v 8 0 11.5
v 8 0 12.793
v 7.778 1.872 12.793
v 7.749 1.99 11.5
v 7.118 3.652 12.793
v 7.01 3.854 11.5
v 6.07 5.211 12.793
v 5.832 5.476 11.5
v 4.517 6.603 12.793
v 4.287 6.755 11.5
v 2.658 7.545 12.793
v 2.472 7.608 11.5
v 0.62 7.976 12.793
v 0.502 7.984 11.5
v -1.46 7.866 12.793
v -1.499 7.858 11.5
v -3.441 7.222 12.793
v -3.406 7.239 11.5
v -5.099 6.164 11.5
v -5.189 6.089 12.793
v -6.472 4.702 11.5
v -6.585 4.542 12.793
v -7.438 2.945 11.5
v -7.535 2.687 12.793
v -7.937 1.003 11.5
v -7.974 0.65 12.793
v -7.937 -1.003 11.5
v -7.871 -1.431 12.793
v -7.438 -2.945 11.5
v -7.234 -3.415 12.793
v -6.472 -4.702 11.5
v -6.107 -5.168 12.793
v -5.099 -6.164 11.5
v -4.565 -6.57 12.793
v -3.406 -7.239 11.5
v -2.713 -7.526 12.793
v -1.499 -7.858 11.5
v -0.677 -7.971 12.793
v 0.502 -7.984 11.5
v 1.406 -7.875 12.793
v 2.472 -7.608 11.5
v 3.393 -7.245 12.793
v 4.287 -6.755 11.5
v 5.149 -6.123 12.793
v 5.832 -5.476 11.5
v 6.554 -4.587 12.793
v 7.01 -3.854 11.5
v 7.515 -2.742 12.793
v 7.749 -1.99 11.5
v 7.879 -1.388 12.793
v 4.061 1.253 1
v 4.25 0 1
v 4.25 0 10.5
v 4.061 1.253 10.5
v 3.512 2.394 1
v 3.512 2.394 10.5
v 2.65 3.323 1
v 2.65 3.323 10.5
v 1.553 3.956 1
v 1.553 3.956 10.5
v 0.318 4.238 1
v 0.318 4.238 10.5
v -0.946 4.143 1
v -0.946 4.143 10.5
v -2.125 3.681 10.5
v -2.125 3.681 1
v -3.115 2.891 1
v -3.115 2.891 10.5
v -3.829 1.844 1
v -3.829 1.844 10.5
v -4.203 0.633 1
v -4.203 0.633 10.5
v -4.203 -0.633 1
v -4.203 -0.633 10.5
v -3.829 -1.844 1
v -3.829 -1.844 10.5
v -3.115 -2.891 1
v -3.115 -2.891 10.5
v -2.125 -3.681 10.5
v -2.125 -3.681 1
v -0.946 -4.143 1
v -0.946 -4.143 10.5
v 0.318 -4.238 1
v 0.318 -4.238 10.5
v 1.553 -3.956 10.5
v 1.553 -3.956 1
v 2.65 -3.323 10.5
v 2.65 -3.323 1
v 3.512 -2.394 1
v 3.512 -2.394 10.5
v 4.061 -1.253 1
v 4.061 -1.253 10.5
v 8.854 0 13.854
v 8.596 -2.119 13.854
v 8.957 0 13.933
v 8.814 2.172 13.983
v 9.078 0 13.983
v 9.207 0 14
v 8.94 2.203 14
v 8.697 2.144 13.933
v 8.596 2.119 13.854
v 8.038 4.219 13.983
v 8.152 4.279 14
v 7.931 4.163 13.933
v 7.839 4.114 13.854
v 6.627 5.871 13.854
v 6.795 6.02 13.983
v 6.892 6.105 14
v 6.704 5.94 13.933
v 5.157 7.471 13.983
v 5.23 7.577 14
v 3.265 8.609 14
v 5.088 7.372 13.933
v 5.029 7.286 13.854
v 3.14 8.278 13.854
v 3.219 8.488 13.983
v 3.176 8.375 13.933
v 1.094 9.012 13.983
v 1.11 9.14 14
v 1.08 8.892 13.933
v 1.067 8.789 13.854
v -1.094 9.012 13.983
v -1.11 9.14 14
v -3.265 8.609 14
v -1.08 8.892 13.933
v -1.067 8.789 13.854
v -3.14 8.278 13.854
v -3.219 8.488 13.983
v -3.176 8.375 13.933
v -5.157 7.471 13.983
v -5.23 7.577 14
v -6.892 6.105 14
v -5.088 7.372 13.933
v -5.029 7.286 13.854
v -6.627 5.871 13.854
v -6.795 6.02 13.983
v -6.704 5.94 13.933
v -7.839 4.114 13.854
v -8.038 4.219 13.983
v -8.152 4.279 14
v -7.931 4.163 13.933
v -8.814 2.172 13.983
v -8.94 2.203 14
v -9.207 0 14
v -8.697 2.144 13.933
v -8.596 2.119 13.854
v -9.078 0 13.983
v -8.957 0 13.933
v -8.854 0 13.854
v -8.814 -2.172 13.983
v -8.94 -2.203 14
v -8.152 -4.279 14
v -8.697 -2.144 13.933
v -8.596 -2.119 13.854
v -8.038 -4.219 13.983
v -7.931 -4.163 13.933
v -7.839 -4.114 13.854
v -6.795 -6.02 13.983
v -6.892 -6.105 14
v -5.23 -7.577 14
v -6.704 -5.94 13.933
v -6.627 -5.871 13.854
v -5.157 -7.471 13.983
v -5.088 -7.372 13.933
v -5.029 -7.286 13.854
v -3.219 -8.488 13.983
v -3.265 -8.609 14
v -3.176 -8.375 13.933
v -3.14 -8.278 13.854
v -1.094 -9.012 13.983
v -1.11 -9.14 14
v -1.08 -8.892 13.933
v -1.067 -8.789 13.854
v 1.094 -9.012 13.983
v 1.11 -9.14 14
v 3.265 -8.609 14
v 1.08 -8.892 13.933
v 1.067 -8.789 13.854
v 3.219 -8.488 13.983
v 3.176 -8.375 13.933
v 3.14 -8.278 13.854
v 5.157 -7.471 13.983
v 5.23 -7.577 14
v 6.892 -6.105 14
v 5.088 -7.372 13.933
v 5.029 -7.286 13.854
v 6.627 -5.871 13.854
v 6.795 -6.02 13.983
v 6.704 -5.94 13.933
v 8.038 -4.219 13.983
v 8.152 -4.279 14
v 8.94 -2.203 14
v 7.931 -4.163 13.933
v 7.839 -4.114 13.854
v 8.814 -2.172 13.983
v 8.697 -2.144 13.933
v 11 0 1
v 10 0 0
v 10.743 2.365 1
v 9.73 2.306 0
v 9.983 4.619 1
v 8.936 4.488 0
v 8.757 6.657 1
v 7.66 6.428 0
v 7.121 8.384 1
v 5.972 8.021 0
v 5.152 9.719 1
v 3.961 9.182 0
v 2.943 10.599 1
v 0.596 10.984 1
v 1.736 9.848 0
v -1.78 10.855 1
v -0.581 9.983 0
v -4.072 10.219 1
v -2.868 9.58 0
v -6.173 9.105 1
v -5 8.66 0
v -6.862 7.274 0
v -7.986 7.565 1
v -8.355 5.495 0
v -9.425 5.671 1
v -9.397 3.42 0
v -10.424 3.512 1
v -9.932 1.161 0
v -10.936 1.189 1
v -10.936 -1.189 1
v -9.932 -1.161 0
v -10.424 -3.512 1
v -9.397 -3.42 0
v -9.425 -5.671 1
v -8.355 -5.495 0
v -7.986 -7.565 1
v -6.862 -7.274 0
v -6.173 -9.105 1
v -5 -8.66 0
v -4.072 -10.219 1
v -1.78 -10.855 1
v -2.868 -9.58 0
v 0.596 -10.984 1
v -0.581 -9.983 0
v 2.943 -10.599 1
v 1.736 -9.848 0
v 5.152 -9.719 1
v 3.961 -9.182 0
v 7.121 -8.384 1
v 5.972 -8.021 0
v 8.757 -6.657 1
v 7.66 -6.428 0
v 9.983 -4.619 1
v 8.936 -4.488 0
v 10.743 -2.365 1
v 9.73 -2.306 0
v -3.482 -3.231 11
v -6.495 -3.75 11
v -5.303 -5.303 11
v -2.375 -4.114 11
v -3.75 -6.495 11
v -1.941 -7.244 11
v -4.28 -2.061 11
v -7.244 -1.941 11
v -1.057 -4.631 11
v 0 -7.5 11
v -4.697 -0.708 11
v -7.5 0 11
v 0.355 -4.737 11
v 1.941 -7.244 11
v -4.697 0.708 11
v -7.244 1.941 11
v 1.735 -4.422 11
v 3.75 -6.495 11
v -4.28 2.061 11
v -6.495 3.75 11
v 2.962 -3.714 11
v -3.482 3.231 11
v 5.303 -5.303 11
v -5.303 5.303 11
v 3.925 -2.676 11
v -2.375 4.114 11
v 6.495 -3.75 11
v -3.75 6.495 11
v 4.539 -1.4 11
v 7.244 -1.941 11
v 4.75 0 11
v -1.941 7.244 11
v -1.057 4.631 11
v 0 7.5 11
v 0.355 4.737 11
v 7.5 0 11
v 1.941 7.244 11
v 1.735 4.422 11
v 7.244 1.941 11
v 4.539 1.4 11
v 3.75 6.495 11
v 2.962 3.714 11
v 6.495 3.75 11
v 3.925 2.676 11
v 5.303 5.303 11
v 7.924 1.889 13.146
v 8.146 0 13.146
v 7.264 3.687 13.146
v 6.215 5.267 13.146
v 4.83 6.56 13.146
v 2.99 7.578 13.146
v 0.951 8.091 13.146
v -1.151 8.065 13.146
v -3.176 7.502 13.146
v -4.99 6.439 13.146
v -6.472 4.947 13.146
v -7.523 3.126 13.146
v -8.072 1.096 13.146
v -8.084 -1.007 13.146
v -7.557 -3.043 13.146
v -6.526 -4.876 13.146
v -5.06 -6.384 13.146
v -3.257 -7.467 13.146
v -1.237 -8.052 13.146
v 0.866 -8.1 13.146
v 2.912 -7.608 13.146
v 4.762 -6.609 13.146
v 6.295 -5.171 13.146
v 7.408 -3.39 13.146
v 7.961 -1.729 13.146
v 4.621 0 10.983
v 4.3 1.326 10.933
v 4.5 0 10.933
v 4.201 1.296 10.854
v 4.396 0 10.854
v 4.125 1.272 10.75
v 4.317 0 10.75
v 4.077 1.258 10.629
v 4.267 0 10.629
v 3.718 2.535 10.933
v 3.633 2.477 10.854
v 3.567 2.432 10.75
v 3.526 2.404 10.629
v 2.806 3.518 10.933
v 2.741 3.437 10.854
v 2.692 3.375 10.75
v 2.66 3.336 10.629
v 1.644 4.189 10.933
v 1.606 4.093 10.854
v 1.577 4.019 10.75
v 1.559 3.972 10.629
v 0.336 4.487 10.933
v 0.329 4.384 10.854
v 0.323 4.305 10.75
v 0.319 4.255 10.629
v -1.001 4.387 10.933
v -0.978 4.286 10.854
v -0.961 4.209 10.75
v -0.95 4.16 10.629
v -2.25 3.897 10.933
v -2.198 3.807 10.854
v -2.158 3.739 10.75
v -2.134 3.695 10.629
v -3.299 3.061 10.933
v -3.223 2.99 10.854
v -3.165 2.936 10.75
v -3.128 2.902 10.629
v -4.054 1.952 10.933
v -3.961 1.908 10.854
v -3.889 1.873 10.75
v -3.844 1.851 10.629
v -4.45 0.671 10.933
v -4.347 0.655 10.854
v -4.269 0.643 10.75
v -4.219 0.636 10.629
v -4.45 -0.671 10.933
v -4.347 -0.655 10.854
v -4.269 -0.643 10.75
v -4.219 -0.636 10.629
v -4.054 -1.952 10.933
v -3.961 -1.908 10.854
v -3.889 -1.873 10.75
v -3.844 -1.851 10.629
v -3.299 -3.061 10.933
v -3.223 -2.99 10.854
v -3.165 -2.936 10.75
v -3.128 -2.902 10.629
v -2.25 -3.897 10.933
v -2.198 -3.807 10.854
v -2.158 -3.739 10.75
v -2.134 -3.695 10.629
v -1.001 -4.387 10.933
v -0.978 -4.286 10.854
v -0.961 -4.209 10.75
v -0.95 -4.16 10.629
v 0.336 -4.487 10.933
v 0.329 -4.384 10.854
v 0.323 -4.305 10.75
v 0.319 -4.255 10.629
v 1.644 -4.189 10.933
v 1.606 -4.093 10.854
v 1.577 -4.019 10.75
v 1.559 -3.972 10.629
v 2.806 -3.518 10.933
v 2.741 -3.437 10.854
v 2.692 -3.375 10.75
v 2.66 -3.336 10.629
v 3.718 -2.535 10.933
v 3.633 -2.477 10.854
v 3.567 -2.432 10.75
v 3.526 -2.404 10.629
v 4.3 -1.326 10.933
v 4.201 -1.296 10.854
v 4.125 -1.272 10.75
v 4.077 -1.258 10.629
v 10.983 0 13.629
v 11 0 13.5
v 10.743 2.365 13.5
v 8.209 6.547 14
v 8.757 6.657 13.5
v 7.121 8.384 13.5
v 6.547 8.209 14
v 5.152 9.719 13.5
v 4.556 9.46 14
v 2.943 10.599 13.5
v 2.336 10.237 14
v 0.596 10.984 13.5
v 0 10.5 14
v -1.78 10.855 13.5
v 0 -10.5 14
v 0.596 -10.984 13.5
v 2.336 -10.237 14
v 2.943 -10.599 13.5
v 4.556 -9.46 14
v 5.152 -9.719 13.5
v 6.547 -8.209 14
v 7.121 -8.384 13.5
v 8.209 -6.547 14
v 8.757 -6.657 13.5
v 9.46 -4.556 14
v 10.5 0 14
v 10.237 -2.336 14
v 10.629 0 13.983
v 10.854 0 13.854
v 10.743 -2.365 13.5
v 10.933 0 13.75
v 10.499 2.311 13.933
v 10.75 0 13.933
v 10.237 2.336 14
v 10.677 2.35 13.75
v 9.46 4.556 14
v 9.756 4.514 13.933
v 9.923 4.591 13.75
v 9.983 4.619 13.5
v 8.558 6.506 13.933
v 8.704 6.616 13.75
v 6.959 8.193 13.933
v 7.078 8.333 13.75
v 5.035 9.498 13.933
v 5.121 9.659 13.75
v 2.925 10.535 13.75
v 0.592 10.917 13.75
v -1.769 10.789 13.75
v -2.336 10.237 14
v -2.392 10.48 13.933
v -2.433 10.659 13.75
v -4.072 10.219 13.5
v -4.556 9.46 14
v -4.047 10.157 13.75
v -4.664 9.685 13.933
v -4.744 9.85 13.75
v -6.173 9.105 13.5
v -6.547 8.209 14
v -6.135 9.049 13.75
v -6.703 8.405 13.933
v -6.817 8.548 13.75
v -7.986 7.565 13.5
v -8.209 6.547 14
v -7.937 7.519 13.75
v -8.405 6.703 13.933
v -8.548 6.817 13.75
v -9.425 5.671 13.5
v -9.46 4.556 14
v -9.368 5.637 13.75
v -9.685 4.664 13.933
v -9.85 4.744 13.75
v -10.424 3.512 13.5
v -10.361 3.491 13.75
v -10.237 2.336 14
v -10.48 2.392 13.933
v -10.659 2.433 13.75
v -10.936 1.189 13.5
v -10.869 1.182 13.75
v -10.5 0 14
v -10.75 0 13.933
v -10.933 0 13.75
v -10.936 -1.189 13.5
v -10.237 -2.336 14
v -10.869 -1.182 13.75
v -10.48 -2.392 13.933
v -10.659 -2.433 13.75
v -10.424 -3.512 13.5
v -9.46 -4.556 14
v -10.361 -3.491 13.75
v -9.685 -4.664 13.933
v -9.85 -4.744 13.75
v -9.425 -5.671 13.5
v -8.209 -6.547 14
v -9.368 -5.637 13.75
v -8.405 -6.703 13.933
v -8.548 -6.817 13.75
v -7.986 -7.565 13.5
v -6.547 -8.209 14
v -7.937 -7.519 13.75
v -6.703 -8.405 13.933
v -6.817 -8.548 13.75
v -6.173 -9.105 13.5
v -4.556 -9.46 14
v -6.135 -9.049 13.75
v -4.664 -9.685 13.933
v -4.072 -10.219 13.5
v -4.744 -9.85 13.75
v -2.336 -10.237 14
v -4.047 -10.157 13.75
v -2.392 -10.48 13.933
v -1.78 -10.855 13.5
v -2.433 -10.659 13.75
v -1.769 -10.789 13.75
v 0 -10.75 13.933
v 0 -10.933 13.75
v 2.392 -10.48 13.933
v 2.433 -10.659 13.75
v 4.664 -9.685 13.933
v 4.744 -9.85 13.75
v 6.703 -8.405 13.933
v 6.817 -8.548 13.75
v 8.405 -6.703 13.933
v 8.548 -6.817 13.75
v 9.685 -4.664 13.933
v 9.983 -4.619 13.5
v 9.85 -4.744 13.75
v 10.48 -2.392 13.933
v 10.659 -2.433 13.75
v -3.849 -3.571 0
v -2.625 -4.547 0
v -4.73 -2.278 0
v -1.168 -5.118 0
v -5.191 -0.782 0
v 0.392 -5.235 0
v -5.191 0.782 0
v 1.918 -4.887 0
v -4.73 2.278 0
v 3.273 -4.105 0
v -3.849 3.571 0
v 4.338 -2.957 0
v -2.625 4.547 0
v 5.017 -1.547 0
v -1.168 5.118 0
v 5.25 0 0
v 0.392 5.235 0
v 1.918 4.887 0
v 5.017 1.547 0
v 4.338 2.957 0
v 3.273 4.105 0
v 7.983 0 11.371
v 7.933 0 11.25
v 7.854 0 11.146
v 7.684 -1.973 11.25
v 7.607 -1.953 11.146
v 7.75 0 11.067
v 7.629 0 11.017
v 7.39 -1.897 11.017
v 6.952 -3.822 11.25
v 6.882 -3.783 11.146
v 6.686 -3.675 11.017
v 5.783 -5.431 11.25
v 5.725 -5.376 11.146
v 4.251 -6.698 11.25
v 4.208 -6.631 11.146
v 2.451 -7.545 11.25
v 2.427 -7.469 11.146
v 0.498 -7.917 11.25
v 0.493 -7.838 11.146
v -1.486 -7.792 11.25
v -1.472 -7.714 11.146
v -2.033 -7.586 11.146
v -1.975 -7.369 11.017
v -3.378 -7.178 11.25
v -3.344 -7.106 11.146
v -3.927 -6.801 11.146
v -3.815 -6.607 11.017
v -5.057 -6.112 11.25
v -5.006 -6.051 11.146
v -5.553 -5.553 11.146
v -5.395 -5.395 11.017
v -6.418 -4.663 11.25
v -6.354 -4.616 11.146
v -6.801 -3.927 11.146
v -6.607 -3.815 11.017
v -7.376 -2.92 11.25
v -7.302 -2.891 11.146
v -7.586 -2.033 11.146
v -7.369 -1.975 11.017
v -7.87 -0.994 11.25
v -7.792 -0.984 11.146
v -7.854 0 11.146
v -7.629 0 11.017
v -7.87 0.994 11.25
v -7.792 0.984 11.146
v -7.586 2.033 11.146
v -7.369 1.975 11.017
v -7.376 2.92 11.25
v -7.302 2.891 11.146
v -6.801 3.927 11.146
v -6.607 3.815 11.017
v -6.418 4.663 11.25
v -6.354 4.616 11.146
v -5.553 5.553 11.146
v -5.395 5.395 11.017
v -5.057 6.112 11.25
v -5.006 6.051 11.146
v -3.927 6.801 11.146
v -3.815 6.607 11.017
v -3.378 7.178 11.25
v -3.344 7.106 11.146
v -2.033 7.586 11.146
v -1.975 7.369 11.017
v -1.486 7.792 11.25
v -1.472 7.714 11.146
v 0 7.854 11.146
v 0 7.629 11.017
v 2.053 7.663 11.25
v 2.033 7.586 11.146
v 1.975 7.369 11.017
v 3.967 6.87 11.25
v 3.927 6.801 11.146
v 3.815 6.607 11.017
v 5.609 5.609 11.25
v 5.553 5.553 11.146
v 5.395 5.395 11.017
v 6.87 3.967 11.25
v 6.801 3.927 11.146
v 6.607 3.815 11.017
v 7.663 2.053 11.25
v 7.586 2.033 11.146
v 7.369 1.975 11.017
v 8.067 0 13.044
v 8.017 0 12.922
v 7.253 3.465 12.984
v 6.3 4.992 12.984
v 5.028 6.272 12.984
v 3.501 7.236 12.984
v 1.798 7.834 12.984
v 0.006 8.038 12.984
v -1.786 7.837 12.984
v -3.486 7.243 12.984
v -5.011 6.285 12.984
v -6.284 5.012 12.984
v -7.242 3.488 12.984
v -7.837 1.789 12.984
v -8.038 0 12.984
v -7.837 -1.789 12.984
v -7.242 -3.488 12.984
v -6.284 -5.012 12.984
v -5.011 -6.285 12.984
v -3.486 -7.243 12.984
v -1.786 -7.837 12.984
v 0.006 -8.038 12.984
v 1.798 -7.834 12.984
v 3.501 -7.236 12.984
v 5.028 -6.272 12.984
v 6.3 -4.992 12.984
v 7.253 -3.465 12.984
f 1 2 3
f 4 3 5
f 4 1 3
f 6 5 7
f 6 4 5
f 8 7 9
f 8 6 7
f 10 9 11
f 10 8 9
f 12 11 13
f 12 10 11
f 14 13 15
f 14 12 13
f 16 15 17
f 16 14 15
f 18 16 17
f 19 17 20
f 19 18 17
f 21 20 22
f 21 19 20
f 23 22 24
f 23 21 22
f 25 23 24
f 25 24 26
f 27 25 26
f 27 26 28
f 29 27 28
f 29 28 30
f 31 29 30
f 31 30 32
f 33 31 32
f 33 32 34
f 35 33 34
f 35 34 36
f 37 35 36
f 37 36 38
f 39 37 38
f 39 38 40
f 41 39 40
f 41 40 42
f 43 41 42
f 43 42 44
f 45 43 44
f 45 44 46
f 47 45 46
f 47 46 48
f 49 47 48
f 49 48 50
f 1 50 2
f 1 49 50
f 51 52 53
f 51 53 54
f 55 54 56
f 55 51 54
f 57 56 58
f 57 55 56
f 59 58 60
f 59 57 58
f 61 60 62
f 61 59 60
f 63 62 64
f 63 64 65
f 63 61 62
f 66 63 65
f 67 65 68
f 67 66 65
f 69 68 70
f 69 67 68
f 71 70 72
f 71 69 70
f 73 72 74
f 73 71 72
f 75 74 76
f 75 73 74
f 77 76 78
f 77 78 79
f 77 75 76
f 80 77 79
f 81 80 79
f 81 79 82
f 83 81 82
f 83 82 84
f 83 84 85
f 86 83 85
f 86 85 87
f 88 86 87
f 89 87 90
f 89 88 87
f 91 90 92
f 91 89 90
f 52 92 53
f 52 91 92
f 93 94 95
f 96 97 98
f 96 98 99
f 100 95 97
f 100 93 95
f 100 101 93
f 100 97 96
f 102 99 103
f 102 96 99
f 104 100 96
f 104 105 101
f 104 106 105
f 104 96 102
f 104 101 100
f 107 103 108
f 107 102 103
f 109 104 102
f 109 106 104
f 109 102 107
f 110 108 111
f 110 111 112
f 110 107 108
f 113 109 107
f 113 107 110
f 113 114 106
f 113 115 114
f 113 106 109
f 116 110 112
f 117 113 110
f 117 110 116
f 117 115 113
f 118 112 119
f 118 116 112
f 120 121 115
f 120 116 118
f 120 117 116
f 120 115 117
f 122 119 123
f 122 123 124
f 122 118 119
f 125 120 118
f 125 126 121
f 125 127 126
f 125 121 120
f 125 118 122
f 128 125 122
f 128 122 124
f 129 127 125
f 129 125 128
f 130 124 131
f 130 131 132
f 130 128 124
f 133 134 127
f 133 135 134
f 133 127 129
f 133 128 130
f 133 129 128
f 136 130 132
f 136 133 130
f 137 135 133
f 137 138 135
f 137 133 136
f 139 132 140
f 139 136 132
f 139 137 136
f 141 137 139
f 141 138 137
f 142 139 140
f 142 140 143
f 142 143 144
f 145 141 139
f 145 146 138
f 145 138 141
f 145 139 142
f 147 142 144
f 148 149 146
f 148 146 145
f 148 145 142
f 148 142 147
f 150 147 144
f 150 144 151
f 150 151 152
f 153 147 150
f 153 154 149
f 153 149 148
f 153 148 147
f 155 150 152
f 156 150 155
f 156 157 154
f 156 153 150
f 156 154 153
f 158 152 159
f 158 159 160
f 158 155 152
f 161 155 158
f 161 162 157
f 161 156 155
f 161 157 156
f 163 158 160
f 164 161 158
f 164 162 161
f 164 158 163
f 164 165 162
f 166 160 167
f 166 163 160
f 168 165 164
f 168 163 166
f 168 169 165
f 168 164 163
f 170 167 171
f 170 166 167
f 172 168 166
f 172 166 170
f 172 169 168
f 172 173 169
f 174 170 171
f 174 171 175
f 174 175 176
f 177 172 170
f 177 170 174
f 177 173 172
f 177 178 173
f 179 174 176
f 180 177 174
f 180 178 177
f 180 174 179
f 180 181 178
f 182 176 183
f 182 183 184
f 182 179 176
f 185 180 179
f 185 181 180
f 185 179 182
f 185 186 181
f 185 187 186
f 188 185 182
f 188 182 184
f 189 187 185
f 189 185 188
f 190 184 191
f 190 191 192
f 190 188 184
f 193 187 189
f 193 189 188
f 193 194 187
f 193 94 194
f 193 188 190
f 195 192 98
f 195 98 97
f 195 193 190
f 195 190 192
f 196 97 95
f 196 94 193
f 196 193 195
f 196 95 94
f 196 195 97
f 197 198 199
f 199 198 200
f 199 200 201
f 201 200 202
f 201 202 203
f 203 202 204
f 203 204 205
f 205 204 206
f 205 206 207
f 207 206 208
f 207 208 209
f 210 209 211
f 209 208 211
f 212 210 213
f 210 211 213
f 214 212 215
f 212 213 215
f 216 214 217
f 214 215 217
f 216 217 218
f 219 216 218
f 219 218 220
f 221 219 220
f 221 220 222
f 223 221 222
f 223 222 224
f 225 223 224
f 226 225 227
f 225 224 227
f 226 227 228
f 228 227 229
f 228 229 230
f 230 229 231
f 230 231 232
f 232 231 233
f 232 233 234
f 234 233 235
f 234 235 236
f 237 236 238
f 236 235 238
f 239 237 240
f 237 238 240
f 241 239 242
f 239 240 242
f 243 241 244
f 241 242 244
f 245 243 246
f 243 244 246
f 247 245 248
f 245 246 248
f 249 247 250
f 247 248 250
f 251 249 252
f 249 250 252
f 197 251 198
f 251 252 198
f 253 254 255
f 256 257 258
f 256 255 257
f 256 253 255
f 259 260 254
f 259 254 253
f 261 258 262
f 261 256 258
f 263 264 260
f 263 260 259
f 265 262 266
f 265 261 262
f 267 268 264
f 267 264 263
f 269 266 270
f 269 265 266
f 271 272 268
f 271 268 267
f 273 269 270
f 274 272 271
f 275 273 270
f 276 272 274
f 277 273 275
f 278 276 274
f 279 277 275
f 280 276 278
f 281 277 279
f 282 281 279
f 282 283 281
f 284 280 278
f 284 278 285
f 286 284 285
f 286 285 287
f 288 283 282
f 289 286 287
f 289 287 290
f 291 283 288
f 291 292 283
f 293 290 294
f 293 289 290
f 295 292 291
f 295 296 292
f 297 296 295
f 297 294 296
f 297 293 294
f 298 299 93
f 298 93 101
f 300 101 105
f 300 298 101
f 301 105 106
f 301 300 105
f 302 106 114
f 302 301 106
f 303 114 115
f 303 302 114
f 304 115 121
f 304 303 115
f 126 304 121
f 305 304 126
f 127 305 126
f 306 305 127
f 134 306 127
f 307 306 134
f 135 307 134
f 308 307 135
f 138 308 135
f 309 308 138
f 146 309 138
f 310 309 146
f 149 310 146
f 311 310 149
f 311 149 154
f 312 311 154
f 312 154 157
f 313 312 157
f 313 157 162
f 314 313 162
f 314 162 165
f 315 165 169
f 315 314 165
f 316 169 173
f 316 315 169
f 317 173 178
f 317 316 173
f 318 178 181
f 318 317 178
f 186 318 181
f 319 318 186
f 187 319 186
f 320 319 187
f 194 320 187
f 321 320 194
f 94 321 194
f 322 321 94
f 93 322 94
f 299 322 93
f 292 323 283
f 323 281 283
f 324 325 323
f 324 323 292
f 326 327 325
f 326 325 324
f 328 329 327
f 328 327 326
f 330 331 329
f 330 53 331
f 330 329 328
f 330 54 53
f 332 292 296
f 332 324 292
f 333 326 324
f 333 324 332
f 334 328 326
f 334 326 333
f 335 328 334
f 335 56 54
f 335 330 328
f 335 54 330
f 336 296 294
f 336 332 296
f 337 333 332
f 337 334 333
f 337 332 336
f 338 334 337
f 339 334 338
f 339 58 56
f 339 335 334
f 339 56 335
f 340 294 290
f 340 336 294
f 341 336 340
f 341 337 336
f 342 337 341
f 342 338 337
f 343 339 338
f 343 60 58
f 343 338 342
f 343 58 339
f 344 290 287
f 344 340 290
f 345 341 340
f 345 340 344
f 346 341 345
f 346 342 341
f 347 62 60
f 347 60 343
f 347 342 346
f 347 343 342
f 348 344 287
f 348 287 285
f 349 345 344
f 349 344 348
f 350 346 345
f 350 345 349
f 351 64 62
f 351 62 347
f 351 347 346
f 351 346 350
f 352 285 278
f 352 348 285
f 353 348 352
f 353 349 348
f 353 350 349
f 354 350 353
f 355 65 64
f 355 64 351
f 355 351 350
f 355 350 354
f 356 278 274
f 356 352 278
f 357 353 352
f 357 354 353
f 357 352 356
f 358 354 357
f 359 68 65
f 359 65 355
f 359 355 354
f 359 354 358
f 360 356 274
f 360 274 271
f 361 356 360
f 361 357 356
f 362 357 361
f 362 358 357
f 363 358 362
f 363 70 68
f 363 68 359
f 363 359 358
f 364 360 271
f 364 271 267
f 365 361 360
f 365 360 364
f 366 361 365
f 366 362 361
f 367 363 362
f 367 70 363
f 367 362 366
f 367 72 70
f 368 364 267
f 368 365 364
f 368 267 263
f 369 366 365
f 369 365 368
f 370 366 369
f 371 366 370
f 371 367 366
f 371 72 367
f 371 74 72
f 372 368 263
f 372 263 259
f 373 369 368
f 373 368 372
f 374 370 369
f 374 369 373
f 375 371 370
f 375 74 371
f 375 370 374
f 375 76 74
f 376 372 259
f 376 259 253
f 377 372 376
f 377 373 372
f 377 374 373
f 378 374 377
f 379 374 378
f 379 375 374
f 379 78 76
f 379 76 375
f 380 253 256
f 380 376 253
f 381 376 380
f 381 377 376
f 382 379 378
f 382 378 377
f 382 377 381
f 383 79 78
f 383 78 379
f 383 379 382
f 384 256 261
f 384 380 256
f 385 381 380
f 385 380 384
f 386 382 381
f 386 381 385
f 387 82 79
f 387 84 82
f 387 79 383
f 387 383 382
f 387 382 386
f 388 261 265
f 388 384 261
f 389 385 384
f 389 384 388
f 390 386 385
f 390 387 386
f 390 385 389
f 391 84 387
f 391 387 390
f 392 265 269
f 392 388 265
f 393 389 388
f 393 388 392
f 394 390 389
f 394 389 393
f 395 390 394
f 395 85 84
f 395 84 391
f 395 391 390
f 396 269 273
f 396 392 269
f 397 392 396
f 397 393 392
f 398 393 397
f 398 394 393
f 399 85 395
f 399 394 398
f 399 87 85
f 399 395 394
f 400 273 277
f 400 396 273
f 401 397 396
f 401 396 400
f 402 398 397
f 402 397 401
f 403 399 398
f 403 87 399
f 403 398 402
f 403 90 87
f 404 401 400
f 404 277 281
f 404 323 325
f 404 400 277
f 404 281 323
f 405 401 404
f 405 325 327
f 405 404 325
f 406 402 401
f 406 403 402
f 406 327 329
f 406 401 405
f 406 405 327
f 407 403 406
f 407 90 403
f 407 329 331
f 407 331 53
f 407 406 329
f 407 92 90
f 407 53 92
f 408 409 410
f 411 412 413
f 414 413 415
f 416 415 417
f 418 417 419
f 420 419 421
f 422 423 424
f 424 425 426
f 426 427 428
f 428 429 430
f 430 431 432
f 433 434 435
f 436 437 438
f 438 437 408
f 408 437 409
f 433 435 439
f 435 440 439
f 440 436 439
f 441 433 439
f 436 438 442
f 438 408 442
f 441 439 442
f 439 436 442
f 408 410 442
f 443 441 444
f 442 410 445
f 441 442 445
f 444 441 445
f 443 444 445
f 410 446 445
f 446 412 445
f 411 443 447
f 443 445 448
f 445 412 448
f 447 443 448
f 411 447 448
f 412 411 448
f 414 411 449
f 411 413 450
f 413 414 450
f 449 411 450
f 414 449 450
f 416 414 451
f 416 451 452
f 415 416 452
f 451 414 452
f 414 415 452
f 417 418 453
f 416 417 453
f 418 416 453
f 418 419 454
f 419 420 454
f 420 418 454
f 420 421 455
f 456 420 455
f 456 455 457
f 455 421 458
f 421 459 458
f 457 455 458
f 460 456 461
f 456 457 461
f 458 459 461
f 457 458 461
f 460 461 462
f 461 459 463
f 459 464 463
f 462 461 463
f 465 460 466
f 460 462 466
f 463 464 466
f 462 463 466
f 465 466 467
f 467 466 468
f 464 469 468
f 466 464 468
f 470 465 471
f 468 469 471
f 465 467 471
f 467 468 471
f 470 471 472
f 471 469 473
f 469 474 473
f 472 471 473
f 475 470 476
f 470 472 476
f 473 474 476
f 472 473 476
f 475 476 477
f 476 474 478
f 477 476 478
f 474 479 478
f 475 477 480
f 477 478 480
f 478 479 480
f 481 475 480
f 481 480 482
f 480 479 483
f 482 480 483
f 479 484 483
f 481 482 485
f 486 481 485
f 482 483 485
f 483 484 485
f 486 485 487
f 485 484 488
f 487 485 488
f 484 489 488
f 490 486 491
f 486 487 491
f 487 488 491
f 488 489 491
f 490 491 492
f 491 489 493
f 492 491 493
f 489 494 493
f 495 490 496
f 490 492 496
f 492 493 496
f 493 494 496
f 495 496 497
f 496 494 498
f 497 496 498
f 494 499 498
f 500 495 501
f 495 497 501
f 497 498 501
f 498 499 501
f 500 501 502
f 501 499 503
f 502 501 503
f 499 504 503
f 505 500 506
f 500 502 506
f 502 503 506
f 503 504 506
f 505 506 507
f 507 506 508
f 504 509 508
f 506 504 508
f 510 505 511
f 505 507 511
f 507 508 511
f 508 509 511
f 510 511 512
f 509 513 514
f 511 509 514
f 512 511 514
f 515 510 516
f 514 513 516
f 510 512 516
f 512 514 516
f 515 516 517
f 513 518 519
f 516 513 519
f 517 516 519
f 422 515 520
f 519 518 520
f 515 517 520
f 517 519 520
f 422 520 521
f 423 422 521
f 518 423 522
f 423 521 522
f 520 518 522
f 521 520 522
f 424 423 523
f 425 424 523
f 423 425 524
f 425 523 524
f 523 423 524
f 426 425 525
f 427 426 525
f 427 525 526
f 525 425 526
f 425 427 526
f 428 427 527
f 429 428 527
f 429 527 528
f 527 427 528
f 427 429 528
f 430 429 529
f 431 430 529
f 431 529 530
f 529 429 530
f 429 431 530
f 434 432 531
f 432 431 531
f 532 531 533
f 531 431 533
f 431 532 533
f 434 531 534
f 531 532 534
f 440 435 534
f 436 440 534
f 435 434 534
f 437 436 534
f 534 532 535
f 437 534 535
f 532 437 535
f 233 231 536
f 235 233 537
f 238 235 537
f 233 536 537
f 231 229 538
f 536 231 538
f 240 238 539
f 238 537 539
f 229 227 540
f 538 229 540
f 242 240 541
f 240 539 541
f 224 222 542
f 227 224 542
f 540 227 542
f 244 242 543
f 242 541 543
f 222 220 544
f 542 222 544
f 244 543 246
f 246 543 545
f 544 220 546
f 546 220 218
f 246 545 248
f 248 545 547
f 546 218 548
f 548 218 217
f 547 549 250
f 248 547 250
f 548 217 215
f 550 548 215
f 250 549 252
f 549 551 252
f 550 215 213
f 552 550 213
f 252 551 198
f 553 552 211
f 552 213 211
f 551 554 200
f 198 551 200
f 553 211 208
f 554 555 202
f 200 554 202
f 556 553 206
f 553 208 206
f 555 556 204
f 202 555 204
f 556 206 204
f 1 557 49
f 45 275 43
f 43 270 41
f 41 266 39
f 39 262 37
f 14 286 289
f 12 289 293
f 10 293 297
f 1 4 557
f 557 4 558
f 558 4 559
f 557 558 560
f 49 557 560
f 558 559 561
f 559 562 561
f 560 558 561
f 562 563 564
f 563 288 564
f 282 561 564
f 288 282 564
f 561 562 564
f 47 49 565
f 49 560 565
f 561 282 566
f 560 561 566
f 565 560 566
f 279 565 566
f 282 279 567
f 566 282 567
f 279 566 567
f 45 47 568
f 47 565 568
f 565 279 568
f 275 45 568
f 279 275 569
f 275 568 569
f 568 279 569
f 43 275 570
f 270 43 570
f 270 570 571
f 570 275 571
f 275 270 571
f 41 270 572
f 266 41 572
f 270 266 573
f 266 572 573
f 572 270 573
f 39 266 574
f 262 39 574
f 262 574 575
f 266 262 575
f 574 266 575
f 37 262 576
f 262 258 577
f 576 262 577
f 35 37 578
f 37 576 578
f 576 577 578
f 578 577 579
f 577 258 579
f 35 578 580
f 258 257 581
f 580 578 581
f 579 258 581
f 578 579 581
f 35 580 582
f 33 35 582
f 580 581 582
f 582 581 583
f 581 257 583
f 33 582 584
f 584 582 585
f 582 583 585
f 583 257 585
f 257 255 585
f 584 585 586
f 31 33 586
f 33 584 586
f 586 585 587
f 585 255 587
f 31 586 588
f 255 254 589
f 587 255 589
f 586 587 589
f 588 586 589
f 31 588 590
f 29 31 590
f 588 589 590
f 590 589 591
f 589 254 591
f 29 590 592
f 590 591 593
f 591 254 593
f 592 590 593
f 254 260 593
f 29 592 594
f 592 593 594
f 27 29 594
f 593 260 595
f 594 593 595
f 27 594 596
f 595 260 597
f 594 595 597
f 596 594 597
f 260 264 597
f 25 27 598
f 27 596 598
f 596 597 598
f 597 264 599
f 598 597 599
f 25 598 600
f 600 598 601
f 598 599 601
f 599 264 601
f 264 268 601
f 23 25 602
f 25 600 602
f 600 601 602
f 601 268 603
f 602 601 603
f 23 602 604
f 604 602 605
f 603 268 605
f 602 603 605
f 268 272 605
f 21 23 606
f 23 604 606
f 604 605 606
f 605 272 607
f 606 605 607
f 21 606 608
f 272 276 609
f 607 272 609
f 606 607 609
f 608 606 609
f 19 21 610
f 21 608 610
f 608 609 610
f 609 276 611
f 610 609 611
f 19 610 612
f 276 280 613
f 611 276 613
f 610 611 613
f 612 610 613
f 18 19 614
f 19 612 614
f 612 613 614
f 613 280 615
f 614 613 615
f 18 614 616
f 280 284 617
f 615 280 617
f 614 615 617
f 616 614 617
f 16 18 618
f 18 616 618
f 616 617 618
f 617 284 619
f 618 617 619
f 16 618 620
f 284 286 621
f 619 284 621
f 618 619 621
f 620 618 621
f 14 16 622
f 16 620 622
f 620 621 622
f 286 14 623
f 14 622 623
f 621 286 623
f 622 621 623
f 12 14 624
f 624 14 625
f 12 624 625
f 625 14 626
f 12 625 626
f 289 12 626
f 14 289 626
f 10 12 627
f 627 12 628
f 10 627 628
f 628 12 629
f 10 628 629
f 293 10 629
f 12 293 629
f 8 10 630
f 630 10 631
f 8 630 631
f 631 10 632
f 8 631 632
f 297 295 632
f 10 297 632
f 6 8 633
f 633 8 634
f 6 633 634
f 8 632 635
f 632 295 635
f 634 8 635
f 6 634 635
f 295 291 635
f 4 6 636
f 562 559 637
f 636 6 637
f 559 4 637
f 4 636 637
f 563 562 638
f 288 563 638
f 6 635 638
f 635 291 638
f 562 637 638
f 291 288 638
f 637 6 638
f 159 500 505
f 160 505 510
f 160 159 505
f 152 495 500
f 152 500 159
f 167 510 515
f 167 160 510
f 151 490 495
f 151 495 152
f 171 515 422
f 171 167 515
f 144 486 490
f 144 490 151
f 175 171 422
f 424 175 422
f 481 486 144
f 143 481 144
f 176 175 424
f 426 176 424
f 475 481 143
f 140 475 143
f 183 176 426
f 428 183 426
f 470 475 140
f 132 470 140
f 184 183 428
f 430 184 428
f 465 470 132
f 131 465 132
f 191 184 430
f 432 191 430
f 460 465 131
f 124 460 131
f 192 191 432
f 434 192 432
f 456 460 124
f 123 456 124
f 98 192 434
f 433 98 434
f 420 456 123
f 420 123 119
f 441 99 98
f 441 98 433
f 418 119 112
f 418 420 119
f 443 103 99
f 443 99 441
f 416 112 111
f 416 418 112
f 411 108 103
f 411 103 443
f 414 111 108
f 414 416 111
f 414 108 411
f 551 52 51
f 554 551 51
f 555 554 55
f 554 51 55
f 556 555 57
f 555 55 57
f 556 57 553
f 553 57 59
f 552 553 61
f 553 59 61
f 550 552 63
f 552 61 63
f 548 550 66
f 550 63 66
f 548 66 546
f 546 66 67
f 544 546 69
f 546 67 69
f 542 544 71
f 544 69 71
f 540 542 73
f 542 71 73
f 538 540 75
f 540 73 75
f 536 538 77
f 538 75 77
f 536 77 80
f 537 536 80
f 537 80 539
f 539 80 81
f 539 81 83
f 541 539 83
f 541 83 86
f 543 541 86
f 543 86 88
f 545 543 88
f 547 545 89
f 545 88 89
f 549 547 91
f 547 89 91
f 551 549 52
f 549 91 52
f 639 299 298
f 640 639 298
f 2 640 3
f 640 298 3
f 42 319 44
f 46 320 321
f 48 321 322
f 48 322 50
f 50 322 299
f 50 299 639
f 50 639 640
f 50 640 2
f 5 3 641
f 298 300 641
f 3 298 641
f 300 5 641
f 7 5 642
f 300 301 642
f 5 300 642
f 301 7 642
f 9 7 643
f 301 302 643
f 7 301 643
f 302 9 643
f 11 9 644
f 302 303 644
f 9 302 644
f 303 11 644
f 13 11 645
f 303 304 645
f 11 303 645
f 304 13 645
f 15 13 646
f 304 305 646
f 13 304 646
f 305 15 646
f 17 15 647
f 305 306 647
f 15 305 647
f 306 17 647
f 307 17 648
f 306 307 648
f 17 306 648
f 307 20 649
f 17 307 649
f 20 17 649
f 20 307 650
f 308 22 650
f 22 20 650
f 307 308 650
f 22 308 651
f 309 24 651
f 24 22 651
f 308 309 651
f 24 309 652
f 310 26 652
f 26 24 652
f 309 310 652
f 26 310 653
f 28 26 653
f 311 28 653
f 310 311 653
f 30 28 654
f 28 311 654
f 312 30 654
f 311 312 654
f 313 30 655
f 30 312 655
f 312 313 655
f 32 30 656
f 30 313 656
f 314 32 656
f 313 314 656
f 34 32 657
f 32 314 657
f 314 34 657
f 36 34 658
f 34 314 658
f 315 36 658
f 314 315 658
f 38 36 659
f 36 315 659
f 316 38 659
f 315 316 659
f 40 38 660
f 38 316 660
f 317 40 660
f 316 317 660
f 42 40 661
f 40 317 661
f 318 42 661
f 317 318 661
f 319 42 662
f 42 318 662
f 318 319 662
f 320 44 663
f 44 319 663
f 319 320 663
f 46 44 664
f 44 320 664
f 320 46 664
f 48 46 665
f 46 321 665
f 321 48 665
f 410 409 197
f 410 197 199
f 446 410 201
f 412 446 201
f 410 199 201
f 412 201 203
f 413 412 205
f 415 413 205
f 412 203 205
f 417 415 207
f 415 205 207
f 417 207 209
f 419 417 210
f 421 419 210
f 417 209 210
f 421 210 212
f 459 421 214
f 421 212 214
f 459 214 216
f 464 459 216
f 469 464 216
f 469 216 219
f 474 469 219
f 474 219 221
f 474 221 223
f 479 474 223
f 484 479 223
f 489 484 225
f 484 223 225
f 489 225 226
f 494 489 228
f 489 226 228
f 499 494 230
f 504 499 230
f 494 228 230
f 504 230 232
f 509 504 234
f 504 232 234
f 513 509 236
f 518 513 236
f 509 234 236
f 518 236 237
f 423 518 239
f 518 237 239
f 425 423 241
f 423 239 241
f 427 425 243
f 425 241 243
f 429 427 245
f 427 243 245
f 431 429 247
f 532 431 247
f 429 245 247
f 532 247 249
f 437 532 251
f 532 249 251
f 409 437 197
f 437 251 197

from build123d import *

# Parameters (mm, degrees)
F0_R     = 11
F0_R_2   = 8
F0_R_3   = 4.25
F1_DEPTH = 11
F2_DEPTH = 14
F3_SIZE  = 1
F4_R     = 0.5
F5_SIZE  = 1


with BuildPart() as f1:
    # F0 (on Top) → F1 (new body)
    with BuildSketch(Plane.XY):
        Circle(F0_R)
        Circle(F0_R_2, mode=Mode.SUBTRACT)
        Circle(F0_R_2)
        Circle(F0_R_3, mode=Mode.SUBTRACT)
    extrude(amount=F1_DEPTH)

    # F0 (on Top) → F2 (join)
    with BuildSketch(Plane.XY):
        Circle(F0_R)
        Circle(F0_R_2, mode=Mode.SUBTRACT)
    extrude(amount=F2_DEPTH)

    # F3
    f3_edges = [f1.edges().sort_by_distance(p)[0] for p in [
        (-8, 0, 14),
    ]]
    chamfer(f3_edges, length=F3_SIZE)

    # F4
    f4_edges = [f1.edges().sort_by_distance(p)[0] for p in [
        (-9, 0, 14),
        (-8, 0, 13),
        (-11, 0, 14),
        (-8, 0, 11),
        (-4.25, 0, 11),
    ]]
    fillet(f4_edges, radius=F4_R)

    # F5
    f5_edges = [f1.edges().sort_by_distance(p)[0] for p in [
        (-11, 0, 0),
        (-4.25, 0, 0),
    ]]
    chamfer(f5_edges, length=F5_SIZE)


solid = f1.part
